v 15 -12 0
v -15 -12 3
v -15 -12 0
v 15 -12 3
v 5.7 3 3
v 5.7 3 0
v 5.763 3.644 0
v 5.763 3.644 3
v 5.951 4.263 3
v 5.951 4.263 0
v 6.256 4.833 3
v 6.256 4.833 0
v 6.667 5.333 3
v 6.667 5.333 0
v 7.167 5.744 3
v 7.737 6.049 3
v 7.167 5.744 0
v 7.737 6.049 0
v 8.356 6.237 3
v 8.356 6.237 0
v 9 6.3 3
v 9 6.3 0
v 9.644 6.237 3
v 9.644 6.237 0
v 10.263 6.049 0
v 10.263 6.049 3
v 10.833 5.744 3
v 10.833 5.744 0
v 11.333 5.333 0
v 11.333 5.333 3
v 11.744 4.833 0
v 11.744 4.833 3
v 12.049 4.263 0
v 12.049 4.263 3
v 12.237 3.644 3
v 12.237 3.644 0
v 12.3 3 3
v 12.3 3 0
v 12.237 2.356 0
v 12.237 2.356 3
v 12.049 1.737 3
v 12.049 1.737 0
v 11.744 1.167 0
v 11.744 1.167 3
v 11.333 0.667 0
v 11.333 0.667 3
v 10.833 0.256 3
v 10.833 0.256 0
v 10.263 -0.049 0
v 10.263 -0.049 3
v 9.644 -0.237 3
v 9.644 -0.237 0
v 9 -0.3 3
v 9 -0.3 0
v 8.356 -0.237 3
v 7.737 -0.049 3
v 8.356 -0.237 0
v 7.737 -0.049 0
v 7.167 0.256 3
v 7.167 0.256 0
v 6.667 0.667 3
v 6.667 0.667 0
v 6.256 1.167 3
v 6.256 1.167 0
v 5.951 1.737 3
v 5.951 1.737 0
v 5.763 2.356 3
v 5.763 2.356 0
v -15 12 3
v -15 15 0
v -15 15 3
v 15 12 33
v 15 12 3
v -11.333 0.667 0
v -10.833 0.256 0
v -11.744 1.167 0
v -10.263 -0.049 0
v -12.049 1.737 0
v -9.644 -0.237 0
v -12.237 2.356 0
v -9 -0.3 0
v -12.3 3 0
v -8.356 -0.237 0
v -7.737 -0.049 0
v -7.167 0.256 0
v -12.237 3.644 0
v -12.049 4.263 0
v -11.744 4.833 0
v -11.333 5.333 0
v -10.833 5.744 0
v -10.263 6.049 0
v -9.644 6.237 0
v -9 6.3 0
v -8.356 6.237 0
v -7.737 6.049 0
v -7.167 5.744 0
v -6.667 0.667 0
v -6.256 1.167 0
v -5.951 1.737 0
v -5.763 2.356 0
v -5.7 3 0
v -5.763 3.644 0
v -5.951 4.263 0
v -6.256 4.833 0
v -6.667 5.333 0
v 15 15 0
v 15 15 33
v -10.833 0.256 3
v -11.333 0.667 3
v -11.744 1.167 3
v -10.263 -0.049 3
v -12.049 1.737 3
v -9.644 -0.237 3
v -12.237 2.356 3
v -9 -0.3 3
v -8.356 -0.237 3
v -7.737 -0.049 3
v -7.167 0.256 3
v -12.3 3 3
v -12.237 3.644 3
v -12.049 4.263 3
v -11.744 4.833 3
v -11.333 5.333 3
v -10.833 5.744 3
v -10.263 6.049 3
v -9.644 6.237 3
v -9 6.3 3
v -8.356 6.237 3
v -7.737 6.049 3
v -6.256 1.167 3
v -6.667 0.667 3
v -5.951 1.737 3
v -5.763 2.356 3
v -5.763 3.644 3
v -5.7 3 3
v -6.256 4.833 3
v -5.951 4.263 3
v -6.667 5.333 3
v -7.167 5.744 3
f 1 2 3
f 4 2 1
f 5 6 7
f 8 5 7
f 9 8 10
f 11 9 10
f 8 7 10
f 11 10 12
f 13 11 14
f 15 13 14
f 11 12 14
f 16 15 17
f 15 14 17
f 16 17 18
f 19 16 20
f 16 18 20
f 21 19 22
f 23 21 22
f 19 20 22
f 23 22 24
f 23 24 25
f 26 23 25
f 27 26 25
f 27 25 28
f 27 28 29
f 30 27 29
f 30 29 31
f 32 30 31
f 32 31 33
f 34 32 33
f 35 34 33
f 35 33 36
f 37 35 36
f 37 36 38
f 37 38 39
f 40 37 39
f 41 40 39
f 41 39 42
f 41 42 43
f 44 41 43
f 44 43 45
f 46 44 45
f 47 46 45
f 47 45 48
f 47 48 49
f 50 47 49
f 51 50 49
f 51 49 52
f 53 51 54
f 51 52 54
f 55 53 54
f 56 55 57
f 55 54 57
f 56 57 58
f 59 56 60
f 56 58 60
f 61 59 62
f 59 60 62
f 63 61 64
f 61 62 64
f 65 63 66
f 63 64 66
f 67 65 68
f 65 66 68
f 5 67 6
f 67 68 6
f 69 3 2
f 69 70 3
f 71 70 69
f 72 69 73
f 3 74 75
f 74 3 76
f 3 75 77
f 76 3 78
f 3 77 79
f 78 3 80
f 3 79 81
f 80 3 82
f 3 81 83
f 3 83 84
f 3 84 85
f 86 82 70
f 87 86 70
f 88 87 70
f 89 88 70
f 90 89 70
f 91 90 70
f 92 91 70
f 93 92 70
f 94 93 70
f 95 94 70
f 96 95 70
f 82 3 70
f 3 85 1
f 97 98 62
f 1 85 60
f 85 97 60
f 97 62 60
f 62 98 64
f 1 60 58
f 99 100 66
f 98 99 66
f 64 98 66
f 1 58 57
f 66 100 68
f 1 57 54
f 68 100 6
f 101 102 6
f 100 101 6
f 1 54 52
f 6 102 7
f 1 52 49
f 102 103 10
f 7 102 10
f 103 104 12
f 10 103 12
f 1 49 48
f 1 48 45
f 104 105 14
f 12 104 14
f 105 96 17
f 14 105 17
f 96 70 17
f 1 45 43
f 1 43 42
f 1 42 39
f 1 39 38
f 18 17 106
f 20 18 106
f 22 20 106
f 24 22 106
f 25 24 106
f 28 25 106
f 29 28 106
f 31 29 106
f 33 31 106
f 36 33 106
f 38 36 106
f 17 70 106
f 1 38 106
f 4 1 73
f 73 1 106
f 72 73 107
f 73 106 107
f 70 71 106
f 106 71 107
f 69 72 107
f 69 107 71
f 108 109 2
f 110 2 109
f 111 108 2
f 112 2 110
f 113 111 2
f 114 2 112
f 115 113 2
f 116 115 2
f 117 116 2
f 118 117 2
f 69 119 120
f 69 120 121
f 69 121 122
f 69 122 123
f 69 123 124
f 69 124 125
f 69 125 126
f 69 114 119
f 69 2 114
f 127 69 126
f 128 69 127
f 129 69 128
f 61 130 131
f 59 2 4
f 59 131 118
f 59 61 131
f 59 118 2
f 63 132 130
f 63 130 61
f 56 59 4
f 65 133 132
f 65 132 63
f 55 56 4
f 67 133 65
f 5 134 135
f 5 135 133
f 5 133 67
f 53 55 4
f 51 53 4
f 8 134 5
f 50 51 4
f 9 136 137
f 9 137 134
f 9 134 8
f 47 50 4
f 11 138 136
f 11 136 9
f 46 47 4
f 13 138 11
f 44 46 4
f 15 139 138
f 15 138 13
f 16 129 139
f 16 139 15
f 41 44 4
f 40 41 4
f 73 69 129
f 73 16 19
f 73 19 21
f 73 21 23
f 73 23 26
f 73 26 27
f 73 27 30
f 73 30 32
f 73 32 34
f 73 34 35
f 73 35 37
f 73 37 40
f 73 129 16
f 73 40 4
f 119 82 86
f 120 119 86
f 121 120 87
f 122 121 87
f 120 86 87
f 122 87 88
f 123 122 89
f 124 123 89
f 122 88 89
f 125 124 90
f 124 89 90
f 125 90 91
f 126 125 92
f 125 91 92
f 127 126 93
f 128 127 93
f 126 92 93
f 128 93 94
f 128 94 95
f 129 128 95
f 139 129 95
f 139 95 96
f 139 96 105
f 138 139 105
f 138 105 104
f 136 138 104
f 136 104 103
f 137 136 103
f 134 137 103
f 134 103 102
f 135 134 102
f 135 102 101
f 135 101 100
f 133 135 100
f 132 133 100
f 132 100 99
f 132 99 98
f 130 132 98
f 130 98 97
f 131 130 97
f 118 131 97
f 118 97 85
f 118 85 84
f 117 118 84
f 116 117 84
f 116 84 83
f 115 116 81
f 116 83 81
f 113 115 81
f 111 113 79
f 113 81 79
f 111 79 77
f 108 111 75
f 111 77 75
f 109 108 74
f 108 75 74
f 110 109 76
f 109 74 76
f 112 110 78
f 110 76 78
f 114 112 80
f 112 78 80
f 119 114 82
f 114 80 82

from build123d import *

# Parameters (mm, degrees)
BOSS_EXTRUDE1_DEPTH = 3
SKETCH2_W           = 30
SKETCH2_H           = 3
BOSS_EXTRUDE2_DEPTH = 24
SKETCH5_R           = 3.3
CUT_EXTRUDE1_DEPTH  = 10


with BuildPart() as part:
    # Sketch1 → Boss-Extrude1 (new body)
    with BuildSketch(Plane.XZ.offset(-12)):
        Polygon((15, 0), (15, 33), (-15, 3), (-15, 0), align=None)
    extrude(amount=-BOSS_EXTRUDE1_DEPTH)

    # Sketch2 → Boss-Extrude2 (add)
    with BuildSketch(Plane.XZ.offset(-12)):
        with Locations((0, 1.5)):
            Rectangle(SKETCH2_W, SKETCH2_H)
    extrude(amount=BOSS_EXTRUDE2_DEPTH)

    # Sketch5 → Cut-Extrude1 (cut)
    with BuildSketch(Plane(origin=(0, 0, 0), x_dir=(-1, 0, 0), z_dir=(0, 0, -1))):
        with Locations((-9, 3)):
            Circle(SKETCH5_R)
        with Locations((9, 3)):
            Circle(SKETCH5_R)
    extrude(amount=-CUT_EXTRUDE1_DEPTH, mode=Mode.SUBTRACT)


solid = part.part
